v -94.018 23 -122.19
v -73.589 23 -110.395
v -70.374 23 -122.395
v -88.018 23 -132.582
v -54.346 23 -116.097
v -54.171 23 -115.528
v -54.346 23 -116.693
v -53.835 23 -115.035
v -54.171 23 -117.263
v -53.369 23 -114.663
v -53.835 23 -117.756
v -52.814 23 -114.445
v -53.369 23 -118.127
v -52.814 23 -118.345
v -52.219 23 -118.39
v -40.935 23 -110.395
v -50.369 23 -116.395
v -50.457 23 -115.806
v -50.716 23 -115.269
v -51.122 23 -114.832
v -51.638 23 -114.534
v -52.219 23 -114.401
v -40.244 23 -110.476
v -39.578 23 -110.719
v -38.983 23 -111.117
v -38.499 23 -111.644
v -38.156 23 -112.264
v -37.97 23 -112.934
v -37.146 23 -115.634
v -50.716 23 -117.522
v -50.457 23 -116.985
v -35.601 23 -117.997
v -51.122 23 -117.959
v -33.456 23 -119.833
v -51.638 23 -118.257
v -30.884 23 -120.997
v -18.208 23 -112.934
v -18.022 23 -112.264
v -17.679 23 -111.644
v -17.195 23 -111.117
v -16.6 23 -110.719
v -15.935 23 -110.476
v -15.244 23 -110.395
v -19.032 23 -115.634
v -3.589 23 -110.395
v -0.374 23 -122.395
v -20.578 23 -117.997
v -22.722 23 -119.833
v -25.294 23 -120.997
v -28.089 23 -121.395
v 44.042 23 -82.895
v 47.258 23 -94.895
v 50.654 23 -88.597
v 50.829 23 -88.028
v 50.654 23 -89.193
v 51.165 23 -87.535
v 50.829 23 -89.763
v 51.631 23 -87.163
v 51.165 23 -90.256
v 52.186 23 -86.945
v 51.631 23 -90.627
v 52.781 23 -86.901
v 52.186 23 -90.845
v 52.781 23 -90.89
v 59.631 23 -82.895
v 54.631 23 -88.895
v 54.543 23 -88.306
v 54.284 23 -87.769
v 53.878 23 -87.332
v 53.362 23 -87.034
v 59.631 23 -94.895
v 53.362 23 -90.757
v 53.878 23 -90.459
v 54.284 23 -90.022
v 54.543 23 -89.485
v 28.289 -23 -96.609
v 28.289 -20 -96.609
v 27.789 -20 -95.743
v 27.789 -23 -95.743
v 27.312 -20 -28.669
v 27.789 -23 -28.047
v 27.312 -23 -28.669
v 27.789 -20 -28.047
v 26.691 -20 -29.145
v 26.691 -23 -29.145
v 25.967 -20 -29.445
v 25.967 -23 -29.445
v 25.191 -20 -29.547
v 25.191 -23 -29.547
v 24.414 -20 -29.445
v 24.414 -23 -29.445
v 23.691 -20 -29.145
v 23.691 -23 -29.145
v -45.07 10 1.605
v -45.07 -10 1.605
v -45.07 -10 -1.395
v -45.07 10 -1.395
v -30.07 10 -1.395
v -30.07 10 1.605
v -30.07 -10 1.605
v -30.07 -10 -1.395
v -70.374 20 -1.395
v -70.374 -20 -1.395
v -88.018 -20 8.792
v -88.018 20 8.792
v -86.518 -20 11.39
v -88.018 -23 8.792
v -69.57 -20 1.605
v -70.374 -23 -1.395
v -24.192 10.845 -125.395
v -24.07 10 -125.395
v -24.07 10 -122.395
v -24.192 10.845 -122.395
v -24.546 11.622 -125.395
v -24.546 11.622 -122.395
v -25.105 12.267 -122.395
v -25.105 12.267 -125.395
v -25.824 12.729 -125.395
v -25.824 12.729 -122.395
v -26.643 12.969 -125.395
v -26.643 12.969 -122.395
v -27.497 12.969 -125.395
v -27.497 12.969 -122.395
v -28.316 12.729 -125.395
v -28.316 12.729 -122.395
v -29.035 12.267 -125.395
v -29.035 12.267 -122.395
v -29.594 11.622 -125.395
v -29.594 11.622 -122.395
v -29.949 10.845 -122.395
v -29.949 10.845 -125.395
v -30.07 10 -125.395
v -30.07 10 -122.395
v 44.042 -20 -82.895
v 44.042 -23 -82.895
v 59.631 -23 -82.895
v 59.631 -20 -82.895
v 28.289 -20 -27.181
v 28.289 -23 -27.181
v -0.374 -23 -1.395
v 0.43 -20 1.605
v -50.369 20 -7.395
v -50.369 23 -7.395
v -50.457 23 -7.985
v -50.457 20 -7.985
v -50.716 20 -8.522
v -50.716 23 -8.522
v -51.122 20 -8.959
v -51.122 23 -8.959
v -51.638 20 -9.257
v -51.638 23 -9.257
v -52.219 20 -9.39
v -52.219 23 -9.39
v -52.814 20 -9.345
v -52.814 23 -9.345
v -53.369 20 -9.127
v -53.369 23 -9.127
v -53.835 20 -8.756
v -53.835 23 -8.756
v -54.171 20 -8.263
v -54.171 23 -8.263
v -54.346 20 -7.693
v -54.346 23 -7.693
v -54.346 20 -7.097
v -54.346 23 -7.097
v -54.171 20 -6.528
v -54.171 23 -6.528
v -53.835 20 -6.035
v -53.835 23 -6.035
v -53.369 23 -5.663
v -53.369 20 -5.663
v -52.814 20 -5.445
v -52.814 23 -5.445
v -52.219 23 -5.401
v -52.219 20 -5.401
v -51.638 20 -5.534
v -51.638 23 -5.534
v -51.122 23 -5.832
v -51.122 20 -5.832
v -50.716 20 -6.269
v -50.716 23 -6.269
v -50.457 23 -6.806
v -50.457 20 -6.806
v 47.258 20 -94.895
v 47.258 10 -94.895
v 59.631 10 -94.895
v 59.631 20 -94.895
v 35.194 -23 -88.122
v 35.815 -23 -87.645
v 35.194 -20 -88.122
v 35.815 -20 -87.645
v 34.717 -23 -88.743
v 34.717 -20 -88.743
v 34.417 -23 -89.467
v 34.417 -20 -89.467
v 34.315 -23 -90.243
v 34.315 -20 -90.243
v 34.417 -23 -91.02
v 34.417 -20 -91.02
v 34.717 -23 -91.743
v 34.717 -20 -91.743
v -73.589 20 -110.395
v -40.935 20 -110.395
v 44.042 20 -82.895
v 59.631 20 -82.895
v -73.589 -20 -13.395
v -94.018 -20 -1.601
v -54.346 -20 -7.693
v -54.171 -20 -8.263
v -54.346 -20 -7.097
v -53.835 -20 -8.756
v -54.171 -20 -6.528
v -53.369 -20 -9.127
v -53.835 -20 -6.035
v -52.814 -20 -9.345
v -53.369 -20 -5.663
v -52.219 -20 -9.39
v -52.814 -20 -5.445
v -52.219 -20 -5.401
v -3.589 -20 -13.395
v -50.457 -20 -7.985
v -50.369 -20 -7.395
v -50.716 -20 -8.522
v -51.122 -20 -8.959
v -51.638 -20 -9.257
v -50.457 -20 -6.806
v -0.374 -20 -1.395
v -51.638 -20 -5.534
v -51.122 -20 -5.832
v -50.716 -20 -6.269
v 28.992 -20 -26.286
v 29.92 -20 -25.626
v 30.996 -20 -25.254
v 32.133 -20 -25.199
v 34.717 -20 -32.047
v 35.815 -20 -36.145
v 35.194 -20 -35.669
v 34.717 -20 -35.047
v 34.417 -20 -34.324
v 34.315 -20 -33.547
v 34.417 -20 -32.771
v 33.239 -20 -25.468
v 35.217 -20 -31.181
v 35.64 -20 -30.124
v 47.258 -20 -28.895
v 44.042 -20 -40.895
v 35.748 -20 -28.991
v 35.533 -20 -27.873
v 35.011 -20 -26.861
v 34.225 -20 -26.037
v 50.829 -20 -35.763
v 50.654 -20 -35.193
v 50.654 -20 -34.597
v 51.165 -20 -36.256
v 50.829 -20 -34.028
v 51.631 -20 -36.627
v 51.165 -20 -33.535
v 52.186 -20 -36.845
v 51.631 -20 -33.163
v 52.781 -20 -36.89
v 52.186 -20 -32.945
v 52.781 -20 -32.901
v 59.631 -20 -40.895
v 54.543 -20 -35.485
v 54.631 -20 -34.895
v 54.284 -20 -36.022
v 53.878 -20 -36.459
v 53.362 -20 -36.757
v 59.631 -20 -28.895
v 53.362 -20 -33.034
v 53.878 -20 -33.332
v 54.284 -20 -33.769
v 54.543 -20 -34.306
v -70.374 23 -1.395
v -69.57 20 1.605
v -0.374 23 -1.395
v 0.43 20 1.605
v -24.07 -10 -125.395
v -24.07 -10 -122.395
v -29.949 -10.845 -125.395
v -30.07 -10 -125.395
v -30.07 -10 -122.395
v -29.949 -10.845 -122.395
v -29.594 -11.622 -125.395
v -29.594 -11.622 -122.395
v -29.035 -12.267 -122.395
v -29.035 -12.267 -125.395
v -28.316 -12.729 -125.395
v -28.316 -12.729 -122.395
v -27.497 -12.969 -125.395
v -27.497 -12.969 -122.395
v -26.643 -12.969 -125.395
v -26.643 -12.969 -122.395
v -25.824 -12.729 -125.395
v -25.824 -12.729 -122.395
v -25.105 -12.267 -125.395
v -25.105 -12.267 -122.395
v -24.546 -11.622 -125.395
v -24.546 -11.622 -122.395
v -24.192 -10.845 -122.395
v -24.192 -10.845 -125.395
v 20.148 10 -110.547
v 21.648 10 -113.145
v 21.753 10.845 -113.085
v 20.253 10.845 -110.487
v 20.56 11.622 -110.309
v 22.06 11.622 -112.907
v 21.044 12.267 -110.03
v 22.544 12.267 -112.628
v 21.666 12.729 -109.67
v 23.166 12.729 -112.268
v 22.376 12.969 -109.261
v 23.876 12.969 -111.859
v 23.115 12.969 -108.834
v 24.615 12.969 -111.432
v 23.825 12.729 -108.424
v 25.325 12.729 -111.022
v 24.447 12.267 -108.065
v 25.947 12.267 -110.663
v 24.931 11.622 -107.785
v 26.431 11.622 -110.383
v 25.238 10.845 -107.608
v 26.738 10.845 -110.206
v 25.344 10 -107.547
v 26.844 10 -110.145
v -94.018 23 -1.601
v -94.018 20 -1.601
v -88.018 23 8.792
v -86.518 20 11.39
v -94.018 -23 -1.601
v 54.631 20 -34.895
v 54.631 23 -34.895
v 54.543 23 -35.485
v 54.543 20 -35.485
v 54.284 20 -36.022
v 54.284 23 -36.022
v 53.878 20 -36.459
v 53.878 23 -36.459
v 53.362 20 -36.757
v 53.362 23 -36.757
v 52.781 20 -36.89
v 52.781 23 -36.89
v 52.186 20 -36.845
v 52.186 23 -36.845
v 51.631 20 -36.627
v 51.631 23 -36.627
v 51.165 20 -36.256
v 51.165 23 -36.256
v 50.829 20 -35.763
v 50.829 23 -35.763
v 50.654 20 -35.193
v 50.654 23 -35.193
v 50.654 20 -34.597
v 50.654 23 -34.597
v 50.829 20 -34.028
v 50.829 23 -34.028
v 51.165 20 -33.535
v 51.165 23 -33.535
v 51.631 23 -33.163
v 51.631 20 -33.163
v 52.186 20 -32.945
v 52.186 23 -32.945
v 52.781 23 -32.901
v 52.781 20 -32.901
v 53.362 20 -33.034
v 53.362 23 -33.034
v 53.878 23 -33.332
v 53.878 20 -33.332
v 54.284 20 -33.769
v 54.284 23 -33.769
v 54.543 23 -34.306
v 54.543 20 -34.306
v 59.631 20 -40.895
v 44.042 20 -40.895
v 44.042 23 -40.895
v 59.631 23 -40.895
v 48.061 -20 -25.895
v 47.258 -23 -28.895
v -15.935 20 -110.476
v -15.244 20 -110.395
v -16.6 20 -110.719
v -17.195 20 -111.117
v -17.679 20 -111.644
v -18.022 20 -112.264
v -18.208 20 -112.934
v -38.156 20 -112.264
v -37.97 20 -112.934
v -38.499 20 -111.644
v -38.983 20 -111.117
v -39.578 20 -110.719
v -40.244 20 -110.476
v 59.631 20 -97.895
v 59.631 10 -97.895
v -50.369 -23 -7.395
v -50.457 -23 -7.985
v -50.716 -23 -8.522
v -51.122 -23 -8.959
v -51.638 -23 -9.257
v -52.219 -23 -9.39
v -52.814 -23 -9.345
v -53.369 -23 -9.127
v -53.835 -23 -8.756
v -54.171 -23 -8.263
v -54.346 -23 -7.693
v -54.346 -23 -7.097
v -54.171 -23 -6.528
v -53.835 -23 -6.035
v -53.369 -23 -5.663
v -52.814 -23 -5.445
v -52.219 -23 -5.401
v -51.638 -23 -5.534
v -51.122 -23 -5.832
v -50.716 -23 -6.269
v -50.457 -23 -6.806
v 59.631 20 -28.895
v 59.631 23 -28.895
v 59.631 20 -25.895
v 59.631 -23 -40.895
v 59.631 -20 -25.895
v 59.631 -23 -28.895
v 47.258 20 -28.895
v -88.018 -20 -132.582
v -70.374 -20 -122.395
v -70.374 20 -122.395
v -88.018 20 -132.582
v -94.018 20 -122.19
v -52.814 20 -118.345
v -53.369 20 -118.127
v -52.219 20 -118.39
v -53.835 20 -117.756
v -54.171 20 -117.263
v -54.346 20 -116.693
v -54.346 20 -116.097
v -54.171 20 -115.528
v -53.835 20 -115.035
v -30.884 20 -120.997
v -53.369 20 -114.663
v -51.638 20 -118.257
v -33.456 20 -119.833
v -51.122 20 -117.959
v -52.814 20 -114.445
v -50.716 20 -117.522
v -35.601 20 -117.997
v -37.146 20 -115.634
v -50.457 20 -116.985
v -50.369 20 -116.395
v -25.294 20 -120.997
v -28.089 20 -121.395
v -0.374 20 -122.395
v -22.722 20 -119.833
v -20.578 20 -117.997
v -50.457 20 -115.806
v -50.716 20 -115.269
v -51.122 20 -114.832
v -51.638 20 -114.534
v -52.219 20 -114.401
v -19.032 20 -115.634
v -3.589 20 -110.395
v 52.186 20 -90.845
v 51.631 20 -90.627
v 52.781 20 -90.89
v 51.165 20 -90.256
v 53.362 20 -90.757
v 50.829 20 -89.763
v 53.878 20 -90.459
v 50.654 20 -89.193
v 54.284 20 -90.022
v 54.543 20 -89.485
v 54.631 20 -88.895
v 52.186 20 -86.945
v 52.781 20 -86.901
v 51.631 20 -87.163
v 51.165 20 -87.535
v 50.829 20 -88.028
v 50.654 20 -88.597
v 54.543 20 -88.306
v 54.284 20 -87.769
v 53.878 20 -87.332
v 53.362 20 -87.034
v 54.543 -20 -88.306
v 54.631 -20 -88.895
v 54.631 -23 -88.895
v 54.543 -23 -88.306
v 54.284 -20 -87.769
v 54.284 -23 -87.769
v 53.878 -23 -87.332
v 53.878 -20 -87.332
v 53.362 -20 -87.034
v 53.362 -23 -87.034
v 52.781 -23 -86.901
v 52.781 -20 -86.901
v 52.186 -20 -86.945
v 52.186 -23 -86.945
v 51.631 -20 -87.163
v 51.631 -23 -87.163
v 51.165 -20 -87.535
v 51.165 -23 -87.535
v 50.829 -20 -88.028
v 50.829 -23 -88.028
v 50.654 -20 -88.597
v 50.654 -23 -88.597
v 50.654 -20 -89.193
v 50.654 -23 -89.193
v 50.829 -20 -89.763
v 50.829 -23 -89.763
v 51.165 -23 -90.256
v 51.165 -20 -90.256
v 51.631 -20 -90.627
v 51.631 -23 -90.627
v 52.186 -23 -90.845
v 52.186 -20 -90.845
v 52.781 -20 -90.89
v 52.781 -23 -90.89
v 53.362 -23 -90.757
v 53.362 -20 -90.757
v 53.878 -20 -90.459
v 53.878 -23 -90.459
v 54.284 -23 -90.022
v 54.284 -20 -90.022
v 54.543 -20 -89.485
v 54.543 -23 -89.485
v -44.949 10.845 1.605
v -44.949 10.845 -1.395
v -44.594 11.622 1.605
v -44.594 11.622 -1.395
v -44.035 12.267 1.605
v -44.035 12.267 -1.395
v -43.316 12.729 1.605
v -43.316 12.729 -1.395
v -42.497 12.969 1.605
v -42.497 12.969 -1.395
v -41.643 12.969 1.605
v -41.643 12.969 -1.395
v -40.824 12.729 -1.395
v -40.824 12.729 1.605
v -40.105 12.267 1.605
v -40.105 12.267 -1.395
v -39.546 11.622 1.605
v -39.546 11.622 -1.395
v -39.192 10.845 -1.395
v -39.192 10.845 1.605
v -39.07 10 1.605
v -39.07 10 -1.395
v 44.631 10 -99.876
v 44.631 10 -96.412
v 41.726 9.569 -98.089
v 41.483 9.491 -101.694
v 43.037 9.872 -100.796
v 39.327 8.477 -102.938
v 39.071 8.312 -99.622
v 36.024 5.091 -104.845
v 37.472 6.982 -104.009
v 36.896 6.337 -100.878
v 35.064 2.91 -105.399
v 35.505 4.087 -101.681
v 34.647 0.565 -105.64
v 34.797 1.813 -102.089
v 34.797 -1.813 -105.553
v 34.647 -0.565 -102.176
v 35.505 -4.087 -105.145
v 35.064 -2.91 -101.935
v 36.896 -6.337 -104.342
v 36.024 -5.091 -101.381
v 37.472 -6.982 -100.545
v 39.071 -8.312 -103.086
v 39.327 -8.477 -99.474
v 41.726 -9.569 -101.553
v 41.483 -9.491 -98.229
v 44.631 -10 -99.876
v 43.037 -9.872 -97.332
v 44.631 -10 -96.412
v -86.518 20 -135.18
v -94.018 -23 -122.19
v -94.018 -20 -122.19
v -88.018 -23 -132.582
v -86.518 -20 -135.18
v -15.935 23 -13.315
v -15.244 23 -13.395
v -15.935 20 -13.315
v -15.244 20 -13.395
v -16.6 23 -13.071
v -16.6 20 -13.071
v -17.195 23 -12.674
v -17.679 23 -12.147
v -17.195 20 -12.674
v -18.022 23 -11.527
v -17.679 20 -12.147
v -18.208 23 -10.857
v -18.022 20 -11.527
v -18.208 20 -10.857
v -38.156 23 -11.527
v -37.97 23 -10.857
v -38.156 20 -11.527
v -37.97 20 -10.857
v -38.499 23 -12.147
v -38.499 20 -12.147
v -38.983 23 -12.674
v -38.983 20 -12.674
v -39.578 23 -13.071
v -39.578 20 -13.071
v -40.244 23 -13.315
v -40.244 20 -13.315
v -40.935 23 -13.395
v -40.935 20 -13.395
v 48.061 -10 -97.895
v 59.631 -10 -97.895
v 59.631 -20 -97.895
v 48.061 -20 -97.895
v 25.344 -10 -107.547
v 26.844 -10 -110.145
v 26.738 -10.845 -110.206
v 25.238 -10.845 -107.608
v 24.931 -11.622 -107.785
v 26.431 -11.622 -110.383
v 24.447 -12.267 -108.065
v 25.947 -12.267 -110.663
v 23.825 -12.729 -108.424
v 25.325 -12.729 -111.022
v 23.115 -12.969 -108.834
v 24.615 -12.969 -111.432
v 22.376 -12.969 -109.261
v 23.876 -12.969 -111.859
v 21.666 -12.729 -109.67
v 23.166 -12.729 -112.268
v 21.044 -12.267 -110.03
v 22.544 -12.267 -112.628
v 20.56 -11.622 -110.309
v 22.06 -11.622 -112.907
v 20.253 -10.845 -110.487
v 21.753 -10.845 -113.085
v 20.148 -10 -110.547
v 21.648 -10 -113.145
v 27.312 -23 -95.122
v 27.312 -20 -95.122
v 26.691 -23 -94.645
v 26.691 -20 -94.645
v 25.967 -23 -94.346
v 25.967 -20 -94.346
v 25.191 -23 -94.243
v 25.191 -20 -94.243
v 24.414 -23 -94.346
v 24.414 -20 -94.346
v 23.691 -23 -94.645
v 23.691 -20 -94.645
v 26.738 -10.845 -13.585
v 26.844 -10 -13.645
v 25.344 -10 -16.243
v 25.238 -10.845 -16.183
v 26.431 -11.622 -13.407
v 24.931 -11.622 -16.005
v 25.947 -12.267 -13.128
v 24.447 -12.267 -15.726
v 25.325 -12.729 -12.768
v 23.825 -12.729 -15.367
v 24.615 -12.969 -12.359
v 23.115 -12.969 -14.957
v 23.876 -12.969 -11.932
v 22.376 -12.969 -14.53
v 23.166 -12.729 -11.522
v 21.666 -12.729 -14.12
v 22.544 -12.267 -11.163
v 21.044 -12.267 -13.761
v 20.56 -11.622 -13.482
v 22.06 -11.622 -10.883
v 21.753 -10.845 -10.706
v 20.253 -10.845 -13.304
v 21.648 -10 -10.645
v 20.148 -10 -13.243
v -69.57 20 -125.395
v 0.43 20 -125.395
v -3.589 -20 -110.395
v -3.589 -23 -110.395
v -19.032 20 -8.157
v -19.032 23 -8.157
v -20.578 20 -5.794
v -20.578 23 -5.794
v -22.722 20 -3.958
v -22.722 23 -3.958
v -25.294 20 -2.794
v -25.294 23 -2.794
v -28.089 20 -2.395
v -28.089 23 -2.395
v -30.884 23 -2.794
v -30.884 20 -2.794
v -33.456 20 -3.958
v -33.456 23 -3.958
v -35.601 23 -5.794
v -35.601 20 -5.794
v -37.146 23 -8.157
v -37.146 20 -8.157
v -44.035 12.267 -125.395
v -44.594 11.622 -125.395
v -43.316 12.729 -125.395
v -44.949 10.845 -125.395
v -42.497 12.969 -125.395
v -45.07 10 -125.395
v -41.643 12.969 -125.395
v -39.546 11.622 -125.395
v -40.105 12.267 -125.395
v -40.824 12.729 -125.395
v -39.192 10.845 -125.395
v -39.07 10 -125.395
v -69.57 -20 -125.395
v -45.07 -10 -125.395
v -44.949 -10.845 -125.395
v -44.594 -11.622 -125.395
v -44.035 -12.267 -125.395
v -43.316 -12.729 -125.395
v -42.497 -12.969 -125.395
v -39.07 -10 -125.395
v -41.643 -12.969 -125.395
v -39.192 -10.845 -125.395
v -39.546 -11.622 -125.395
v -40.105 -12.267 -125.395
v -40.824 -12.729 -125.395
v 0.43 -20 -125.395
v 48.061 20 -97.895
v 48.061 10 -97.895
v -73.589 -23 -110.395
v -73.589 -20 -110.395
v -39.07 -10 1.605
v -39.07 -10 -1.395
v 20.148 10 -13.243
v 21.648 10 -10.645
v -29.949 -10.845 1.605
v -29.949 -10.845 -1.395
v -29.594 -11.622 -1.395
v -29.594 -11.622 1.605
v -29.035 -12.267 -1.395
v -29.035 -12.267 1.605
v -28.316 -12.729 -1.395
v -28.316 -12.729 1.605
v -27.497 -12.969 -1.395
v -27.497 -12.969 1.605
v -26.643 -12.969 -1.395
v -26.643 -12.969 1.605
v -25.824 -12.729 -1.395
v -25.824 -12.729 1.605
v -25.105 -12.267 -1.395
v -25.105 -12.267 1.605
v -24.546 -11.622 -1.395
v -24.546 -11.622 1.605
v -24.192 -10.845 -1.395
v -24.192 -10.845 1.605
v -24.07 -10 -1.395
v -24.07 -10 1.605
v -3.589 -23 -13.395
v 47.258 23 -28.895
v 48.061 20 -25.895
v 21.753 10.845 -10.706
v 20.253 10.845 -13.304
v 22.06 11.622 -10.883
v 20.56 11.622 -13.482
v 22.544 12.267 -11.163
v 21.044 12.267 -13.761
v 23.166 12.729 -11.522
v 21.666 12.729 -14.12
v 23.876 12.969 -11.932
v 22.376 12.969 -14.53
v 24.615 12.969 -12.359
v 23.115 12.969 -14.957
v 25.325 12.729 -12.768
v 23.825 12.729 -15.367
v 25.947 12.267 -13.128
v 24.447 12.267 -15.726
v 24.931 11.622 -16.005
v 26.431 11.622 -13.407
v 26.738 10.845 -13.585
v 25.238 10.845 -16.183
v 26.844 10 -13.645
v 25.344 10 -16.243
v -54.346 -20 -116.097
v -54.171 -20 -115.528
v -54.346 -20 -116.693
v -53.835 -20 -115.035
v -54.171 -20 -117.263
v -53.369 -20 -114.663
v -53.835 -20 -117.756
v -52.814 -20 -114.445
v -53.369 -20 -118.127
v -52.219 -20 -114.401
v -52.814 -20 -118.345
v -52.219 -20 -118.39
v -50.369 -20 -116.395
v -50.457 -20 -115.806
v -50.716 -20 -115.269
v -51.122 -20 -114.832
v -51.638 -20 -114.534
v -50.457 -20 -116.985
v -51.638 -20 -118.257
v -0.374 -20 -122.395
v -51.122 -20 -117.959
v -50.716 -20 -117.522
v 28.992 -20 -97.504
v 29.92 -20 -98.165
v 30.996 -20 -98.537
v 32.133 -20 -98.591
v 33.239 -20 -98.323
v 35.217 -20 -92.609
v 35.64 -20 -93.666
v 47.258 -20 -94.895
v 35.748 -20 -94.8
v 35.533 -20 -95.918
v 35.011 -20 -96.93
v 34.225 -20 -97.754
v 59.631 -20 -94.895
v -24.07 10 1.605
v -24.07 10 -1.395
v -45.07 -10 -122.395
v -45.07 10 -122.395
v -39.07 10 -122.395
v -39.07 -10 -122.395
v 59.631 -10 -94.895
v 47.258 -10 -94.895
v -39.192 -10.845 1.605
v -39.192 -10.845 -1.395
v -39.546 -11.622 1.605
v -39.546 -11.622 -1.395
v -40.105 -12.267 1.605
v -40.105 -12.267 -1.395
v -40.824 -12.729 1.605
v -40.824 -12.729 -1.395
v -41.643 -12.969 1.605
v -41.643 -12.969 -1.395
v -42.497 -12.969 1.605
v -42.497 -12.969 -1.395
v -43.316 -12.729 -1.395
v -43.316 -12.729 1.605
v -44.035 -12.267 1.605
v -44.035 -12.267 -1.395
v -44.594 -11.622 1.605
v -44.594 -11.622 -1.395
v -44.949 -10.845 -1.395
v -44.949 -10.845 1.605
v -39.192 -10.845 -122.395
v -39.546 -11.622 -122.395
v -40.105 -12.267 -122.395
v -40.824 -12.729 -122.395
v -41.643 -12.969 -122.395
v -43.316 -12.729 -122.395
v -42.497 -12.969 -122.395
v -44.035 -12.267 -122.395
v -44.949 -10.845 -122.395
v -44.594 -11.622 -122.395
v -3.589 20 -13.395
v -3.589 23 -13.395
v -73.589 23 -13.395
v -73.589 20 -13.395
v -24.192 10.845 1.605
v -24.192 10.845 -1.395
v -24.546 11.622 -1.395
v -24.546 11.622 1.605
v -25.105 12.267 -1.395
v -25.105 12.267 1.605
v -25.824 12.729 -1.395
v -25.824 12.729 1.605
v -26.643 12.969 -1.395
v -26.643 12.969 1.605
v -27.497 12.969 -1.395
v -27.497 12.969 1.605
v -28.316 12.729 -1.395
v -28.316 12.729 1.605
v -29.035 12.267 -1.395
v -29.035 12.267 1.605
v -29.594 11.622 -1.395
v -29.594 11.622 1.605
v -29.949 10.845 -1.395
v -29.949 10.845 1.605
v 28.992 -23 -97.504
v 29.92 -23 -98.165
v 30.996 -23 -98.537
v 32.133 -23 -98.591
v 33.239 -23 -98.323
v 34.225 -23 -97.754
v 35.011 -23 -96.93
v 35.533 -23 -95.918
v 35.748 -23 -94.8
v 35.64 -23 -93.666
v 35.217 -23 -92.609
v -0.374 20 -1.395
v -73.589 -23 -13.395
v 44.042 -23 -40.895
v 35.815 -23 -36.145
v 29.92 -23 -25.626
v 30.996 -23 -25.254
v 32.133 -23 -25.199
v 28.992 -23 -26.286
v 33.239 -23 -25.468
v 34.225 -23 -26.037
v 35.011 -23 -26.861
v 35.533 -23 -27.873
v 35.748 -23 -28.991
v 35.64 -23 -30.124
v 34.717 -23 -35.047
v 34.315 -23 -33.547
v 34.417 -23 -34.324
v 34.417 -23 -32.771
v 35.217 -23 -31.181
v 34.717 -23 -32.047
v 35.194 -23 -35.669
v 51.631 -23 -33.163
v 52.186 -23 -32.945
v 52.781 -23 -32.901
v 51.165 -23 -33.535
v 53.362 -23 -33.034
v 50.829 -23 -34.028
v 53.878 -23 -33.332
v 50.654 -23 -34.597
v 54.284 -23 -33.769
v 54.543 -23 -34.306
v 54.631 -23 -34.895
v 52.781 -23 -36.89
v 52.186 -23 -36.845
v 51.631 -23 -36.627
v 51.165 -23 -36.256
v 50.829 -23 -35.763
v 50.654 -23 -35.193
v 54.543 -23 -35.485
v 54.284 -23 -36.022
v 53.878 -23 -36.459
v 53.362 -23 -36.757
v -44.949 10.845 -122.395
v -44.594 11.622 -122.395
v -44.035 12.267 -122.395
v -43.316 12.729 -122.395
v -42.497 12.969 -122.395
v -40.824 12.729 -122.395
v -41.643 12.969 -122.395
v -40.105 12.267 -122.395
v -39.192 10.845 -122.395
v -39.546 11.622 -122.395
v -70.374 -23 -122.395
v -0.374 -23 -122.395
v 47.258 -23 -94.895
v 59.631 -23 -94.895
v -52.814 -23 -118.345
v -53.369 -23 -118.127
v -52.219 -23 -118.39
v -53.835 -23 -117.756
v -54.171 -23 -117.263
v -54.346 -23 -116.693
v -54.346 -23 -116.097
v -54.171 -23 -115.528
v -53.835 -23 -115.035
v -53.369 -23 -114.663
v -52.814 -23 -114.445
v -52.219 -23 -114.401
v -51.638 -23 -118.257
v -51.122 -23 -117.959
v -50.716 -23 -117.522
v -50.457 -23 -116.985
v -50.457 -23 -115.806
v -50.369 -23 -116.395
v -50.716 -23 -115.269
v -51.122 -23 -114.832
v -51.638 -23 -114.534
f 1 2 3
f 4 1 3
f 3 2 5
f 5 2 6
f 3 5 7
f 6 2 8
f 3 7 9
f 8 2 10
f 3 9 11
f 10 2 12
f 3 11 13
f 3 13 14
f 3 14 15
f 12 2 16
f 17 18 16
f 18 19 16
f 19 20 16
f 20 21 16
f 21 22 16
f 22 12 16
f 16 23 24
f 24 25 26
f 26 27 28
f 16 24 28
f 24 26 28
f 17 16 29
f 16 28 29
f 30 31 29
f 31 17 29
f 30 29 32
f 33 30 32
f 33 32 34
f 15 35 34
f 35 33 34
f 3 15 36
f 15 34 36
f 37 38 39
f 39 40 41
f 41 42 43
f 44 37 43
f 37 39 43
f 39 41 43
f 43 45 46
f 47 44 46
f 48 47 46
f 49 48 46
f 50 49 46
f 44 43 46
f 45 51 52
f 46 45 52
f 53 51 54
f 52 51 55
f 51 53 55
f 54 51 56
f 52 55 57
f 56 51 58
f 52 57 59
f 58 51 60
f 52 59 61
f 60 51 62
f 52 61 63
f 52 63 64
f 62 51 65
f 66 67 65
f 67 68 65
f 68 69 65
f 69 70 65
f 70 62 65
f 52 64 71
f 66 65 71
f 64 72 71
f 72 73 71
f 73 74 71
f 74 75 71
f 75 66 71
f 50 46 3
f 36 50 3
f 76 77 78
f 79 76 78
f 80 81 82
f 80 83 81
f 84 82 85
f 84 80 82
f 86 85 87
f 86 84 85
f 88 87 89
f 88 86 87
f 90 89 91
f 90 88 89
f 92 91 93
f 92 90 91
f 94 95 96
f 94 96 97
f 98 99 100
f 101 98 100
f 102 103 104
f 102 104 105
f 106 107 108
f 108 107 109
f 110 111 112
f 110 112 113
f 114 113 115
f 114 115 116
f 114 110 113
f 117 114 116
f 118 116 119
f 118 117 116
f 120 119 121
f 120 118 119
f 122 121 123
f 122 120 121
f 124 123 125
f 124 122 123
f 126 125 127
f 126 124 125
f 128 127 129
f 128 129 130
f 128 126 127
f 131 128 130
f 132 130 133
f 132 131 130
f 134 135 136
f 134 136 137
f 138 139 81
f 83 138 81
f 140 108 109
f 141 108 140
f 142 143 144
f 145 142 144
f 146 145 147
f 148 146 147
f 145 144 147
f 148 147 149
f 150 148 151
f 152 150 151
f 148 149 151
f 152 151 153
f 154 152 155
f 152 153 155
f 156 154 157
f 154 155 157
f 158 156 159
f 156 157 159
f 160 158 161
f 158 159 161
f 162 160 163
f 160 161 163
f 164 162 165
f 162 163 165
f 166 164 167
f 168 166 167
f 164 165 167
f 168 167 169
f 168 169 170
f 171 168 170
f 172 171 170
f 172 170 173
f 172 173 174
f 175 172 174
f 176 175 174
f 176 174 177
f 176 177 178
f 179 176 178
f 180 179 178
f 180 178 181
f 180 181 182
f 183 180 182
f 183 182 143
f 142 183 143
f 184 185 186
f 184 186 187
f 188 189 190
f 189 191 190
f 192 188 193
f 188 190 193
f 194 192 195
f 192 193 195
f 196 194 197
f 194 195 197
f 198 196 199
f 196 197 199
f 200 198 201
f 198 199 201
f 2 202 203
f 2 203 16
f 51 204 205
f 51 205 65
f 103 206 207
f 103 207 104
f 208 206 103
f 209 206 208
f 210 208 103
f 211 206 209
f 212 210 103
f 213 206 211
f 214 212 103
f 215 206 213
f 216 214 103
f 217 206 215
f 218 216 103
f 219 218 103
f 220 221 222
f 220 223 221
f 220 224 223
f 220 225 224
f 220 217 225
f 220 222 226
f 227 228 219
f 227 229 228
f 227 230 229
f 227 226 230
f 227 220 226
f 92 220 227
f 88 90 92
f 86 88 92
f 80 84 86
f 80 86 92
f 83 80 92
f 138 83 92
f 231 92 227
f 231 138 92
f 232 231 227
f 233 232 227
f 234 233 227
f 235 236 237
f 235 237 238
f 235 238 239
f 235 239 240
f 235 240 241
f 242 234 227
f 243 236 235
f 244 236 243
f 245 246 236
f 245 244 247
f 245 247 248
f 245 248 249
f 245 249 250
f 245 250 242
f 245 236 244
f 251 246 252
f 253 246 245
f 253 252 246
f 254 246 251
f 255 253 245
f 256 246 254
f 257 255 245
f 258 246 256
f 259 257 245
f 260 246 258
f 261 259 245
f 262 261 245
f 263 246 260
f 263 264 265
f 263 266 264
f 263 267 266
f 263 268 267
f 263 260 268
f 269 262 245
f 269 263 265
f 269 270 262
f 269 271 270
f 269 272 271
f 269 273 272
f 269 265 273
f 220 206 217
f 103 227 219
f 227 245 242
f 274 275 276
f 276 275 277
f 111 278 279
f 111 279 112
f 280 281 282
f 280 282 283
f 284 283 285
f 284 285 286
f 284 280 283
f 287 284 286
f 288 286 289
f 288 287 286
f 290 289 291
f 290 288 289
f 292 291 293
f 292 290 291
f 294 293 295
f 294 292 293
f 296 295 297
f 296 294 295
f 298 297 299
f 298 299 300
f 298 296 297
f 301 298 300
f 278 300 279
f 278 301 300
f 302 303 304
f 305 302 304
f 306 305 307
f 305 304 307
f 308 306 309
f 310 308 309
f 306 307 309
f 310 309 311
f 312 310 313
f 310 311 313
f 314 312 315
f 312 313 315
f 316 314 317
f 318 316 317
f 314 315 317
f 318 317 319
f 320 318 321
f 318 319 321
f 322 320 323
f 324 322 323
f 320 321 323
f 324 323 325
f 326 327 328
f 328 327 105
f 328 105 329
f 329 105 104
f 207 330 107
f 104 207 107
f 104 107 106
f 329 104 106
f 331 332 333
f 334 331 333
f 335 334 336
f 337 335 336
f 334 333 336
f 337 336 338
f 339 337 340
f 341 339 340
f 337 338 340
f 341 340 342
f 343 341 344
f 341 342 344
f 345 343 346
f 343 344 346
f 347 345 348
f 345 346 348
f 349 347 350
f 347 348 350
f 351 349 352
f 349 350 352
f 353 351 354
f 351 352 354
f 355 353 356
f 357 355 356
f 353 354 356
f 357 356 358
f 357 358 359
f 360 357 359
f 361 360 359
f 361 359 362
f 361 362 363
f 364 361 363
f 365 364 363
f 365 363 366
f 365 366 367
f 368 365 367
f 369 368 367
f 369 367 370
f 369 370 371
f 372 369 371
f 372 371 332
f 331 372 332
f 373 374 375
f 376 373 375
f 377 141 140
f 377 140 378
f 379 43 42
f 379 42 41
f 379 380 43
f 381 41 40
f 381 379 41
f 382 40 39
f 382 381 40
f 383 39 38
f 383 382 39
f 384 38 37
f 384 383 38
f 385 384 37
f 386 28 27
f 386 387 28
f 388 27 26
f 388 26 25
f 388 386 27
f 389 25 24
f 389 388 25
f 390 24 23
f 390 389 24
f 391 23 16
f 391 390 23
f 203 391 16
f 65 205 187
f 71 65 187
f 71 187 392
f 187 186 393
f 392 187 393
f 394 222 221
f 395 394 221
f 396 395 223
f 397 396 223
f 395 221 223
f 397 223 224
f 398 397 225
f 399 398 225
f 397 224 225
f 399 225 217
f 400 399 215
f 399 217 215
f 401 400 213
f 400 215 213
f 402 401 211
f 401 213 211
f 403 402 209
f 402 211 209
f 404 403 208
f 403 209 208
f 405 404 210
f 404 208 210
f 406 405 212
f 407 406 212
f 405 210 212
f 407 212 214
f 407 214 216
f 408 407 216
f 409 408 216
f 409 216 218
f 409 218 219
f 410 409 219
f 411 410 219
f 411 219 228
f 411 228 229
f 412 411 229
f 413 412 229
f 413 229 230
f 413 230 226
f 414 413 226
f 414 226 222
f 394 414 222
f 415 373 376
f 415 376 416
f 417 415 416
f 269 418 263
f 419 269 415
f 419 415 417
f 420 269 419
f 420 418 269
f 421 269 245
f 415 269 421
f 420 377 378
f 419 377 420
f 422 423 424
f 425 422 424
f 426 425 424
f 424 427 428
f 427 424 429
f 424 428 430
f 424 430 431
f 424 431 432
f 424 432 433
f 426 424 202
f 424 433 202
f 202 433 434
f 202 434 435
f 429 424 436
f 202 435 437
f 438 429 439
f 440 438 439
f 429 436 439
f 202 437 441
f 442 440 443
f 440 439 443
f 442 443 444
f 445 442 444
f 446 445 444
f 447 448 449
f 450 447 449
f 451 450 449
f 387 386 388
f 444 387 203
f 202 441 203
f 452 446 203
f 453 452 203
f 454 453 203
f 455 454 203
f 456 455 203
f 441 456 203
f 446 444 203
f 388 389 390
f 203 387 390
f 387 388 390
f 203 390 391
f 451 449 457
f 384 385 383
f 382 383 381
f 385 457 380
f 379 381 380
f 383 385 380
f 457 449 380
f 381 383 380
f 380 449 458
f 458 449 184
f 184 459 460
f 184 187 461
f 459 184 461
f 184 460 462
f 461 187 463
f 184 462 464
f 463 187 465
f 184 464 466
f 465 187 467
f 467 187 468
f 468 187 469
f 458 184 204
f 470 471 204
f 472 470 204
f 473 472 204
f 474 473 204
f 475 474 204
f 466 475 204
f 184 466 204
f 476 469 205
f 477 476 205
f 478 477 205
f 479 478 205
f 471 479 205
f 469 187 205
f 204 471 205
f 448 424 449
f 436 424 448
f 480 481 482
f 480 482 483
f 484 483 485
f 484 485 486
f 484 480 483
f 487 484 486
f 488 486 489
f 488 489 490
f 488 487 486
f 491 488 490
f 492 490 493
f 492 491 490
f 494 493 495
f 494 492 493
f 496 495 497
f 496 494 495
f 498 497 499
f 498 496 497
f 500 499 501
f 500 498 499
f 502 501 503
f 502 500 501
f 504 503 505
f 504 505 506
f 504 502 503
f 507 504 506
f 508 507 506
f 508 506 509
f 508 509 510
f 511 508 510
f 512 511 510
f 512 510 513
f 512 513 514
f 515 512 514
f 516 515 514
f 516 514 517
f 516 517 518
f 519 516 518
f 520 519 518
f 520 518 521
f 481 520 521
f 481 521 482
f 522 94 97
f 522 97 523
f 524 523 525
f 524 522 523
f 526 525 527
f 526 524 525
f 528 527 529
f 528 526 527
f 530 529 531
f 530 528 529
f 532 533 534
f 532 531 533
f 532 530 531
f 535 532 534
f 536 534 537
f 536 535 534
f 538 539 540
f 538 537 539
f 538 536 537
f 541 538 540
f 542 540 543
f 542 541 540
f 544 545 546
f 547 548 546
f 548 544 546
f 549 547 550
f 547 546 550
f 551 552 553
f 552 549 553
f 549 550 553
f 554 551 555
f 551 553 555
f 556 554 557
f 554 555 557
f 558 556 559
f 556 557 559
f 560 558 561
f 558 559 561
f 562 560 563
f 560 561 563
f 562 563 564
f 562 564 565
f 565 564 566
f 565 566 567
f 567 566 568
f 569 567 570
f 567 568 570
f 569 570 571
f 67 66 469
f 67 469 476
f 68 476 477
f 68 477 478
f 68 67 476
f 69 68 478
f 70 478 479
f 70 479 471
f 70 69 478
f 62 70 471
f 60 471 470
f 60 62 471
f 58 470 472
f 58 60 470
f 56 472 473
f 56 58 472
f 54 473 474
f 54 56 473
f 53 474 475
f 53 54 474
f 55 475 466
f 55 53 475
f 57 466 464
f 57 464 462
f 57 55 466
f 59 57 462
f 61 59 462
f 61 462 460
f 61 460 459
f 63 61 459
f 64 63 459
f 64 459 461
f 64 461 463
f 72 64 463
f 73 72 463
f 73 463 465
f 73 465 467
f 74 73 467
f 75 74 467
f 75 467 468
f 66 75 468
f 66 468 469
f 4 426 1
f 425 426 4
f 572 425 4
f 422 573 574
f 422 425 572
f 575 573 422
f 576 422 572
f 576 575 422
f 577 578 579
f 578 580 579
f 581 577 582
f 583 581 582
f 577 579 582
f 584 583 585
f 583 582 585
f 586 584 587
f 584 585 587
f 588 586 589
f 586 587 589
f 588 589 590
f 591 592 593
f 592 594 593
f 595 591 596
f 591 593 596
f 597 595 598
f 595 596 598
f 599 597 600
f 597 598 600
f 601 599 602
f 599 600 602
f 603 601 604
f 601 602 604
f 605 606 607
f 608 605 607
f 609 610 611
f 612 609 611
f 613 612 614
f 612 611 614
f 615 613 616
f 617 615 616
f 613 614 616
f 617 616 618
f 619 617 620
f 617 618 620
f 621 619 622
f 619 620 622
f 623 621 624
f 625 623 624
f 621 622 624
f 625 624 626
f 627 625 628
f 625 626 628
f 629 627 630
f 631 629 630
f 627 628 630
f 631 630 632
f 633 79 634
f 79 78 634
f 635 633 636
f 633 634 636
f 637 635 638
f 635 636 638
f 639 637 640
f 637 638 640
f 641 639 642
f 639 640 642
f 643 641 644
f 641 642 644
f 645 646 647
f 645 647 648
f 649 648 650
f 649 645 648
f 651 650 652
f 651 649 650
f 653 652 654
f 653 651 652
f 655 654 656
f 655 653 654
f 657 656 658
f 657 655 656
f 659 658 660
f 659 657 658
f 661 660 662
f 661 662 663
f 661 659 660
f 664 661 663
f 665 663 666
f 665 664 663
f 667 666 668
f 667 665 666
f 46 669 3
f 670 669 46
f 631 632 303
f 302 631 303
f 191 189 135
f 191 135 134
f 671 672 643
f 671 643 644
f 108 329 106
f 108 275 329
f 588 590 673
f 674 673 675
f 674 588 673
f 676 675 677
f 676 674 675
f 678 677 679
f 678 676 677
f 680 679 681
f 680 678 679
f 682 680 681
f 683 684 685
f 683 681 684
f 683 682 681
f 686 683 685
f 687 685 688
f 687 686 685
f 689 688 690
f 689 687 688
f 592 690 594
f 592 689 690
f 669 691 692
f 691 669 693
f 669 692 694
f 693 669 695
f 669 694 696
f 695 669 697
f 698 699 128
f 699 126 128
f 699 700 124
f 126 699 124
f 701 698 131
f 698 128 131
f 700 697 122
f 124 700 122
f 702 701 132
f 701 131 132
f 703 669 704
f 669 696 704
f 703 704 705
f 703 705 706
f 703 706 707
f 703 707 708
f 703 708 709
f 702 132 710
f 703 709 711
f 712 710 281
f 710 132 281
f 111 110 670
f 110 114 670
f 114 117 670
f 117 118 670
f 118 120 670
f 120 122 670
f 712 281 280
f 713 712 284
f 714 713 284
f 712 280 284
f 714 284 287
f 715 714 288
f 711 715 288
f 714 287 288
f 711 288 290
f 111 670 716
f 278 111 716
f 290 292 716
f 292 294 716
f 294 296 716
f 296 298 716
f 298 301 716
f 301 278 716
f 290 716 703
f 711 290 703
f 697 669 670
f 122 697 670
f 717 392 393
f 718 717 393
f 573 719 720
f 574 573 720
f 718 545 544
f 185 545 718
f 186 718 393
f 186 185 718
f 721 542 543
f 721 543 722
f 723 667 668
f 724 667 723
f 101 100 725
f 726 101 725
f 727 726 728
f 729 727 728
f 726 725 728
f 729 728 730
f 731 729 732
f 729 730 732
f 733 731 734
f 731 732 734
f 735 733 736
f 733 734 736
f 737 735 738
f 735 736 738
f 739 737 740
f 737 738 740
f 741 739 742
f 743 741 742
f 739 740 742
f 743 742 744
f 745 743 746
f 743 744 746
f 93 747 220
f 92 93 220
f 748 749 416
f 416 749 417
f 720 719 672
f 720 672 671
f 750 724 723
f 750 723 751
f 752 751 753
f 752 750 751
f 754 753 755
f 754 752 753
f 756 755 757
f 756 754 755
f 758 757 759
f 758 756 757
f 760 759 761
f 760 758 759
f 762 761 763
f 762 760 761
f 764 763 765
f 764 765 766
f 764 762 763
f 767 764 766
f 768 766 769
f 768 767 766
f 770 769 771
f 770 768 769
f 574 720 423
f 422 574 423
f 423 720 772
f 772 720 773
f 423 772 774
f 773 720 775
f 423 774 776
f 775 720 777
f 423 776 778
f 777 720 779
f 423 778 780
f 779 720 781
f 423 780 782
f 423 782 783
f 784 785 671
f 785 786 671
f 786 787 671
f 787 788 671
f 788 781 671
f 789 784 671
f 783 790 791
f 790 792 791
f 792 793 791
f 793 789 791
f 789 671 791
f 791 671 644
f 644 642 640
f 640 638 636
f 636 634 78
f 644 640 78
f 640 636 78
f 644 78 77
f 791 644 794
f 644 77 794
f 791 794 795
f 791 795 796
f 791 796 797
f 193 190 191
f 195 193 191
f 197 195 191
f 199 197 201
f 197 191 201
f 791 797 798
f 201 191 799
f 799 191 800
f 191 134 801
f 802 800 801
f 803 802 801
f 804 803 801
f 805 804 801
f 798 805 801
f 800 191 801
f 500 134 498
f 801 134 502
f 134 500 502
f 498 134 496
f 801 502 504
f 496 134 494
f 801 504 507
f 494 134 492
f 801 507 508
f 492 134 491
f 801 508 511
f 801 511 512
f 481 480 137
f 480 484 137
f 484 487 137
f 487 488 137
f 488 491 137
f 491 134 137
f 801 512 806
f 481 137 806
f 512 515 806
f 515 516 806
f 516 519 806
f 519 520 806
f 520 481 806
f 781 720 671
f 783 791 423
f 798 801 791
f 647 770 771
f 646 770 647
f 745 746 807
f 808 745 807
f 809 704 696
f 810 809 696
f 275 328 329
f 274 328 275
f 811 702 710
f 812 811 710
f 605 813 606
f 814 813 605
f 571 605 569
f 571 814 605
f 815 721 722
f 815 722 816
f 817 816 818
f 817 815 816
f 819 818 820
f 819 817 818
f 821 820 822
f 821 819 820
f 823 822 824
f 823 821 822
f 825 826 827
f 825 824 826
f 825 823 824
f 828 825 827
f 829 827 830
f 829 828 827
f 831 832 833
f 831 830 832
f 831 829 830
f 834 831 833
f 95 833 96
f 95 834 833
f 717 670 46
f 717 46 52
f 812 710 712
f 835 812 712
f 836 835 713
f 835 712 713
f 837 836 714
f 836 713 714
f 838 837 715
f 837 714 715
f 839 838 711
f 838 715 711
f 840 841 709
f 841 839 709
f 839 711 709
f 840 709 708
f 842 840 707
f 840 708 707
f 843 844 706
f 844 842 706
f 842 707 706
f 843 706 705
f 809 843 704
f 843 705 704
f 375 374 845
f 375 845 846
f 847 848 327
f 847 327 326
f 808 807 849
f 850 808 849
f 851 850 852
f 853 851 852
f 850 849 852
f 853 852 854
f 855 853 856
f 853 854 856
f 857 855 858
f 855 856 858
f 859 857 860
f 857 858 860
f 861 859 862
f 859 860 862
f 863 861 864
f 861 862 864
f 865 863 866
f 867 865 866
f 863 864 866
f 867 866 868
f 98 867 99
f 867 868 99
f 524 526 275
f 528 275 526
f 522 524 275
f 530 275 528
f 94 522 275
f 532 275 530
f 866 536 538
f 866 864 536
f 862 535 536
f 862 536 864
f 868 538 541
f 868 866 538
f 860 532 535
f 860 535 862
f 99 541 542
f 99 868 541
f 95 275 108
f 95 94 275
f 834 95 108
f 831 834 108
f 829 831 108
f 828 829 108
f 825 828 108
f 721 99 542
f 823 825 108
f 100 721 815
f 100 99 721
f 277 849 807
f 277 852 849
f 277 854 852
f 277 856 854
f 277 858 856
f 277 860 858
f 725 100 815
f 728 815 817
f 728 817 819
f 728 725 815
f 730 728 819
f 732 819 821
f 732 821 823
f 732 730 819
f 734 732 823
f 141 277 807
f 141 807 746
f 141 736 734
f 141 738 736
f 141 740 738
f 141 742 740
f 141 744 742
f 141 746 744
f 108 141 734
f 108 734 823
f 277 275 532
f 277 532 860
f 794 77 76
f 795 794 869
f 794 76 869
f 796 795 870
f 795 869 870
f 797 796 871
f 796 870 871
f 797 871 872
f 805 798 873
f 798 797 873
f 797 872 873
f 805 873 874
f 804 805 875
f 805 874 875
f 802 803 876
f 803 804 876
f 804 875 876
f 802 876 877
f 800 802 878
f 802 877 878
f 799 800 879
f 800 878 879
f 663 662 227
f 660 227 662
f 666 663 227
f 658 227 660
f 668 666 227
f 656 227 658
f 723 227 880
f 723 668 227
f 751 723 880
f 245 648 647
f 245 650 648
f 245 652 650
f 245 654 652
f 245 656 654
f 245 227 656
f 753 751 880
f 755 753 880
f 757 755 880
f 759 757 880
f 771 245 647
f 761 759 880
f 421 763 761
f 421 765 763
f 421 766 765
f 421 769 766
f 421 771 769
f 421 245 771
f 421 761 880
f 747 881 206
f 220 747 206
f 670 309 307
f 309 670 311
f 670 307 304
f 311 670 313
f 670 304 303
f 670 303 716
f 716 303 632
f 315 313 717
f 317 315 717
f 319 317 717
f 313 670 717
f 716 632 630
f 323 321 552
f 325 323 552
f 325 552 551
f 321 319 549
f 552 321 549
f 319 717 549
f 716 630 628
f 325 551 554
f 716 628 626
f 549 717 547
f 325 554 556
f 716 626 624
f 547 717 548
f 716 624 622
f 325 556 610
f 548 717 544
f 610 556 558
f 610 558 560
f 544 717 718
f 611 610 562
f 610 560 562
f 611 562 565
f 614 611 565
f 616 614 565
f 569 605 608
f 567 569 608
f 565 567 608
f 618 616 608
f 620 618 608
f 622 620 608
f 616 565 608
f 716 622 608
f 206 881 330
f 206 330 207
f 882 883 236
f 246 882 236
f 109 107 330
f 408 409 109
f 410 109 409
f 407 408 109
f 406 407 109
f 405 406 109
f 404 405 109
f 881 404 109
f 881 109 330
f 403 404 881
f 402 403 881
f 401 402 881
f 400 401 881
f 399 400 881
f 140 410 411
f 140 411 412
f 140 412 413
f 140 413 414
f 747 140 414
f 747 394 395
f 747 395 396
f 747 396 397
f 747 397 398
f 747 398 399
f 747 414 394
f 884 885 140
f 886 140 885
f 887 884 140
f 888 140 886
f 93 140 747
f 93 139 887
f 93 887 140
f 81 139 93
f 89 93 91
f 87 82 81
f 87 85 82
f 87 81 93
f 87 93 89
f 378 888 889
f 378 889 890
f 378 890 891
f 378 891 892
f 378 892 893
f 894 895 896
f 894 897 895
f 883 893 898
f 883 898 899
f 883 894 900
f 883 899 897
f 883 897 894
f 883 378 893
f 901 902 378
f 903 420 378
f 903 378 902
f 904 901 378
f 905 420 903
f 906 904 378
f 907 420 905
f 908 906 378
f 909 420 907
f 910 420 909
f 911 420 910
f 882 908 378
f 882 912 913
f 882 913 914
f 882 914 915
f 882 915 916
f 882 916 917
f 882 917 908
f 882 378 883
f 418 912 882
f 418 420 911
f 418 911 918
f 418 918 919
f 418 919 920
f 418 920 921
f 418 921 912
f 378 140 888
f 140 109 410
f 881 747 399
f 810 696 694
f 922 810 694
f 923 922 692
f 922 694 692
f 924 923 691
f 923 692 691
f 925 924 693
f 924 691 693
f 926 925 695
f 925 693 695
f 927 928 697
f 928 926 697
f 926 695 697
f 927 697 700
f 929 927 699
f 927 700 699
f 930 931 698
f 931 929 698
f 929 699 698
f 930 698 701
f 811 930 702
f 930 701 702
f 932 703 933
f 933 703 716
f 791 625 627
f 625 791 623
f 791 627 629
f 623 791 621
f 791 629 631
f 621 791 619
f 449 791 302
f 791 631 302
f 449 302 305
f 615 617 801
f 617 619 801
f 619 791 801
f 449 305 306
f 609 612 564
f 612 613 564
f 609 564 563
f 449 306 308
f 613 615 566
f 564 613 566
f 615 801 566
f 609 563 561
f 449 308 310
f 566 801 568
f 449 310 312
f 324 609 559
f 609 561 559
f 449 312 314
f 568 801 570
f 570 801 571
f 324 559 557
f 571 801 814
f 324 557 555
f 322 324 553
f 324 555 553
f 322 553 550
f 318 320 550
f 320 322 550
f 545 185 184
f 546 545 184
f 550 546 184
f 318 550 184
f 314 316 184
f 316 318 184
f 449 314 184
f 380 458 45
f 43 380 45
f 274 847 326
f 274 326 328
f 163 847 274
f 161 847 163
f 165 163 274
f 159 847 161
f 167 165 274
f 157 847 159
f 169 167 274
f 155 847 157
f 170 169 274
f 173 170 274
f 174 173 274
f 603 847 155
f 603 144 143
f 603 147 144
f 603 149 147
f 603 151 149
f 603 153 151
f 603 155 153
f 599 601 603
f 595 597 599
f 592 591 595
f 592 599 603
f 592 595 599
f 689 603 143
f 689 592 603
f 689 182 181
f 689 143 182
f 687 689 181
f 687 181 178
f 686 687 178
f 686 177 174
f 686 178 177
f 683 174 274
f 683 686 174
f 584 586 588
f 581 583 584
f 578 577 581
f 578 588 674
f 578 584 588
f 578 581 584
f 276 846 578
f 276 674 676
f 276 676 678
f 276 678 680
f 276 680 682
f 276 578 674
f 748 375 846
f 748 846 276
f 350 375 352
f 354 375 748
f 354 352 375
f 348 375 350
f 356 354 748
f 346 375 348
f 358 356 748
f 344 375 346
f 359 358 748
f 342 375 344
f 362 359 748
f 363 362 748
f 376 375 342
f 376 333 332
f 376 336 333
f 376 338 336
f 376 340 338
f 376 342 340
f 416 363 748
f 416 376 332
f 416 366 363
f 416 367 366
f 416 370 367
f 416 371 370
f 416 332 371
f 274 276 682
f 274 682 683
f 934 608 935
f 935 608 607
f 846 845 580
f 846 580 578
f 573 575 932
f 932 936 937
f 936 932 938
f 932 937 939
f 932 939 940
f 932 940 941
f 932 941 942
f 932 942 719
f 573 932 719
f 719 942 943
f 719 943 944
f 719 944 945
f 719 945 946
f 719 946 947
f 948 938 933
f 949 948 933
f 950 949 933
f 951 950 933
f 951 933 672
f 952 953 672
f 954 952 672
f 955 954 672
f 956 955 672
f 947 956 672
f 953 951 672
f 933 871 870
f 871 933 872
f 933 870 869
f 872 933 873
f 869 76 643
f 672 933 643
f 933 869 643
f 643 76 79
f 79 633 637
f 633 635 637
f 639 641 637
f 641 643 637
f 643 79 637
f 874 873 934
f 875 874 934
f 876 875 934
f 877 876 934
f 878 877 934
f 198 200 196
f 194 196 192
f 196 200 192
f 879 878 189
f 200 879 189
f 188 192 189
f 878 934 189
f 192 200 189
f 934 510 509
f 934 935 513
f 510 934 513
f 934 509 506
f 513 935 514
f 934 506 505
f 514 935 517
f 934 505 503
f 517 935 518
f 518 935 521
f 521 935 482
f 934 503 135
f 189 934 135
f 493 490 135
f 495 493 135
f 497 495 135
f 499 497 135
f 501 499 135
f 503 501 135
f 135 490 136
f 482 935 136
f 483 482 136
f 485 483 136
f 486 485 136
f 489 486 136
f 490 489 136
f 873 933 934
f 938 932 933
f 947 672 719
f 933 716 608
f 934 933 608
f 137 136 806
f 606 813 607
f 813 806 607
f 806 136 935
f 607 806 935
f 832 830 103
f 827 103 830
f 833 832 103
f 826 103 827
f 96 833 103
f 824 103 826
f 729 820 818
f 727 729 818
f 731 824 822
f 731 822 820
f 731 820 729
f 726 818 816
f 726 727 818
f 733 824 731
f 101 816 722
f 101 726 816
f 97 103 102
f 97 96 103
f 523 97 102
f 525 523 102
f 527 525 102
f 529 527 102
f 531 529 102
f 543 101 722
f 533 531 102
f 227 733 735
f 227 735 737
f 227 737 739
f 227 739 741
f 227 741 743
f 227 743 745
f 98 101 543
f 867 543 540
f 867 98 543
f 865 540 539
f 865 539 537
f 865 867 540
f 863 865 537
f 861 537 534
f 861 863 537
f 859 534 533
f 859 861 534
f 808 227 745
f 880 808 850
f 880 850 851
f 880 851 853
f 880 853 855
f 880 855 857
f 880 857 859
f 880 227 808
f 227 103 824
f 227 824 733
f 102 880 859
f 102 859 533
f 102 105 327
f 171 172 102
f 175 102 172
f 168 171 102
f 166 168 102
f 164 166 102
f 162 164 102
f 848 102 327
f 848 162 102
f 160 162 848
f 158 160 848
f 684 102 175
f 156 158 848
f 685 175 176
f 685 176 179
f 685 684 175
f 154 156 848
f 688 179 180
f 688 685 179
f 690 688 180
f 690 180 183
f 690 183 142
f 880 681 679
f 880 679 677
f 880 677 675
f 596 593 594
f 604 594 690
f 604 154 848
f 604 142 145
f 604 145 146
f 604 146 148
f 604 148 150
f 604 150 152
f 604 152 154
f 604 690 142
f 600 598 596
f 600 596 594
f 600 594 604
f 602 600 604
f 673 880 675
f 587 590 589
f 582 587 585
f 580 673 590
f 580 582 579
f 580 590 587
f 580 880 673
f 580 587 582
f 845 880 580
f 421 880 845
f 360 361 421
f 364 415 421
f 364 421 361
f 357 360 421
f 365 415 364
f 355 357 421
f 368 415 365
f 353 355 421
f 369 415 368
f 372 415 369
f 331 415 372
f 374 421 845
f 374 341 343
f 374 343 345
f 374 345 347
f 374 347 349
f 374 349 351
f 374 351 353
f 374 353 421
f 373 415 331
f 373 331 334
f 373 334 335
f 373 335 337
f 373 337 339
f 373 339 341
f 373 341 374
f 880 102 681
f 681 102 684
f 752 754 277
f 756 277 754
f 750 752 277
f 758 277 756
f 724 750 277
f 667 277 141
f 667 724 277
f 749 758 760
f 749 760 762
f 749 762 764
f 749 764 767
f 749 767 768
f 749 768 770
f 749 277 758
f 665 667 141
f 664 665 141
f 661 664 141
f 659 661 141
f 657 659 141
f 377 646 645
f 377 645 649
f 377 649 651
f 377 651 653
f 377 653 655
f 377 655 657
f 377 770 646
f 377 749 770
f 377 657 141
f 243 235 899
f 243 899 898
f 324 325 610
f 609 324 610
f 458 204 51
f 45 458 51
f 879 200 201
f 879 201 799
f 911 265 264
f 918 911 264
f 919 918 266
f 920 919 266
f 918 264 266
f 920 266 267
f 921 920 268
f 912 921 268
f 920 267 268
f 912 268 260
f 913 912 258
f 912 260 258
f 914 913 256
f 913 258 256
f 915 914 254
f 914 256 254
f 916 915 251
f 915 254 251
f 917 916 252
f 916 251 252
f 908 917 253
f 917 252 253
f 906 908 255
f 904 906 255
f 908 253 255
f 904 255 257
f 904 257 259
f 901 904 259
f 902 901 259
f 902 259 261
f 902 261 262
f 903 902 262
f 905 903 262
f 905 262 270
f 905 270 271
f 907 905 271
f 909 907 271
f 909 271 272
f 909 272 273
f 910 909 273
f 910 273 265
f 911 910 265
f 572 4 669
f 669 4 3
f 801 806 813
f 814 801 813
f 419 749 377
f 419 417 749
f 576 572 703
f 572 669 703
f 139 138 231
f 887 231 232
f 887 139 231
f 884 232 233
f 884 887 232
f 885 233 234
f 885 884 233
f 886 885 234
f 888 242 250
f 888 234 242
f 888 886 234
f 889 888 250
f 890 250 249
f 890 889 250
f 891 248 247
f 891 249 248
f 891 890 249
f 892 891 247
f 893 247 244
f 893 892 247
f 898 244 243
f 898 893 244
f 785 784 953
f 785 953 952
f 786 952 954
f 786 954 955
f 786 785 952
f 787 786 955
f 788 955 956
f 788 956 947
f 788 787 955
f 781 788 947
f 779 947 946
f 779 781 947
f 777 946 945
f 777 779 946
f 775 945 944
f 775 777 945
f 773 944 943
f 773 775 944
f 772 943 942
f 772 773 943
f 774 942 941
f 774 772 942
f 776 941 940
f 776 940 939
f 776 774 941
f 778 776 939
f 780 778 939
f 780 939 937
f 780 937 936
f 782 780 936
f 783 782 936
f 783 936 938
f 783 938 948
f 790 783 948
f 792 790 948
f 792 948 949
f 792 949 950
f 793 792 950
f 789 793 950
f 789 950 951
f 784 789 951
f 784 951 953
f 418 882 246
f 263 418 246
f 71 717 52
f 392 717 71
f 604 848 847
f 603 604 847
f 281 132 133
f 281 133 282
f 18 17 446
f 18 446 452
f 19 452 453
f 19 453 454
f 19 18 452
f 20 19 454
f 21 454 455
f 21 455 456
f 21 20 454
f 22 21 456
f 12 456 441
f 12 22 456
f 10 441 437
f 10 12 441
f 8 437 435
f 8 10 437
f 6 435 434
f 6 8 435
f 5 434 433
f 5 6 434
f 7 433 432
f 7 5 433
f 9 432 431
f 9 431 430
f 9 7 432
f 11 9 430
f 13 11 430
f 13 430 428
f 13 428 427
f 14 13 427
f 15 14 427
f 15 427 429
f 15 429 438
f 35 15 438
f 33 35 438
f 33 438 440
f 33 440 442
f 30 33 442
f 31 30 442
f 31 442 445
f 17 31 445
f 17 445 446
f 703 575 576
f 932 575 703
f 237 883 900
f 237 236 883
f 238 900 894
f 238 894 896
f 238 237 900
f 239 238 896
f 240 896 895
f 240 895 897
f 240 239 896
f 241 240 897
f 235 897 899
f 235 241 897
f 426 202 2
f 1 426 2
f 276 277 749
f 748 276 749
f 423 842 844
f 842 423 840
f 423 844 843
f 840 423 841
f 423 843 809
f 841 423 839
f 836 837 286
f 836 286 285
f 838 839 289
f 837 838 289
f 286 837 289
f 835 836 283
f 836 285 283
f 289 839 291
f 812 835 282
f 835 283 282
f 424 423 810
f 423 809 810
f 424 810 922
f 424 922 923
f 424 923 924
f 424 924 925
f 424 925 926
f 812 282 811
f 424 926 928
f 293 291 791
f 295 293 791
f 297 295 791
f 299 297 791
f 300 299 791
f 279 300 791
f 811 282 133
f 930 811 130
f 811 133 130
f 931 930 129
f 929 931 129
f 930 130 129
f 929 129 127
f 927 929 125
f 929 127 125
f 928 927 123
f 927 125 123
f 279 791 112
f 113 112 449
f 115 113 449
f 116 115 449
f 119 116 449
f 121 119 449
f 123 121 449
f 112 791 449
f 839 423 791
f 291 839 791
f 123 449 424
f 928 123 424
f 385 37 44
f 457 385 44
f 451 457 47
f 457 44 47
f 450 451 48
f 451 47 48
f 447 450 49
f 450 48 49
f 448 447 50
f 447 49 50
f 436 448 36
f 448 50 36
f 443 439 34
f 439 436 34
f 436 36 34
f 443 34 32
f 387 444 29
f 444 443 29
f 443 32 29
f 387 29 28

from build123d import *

# Parameters (mm, degrees)
CUT_EXTRUDE3_DEPTH      = 5
CUT_EXTRUDE4_DEPTH      = 10
CHAMFER1_SIZE           = 3
CUT_EXTRUDE6_DEPTH      = 3
F_4_0MM_DOWEL_HOLE2_D   = 4
CUT_EXTRUDE9_DEPTH      = 10
CUT_EXTRUDE7_DEPTH      = 146.985046122
CUT_EXTRUDE7_DEPTH_BACK = 5
FILLET1_R               = 3
FILLET2_R               = 3


with BuildPart() as part:
    # Sweep8: sweep along a path in Sketch6
    with BuildLine(Plane(origin=(0, 0, 0), x_dir=(1, 0, 0), z_dir=(0, 1, 0))) as sweep8_path:
        Line((-87.320508076, -10), (-70, 0))
        Line((-70, 0), (0, 0))
        Line((0, 0), (47.631397208, 27.5))
        Line((47.631397208, 27.5), (59.631397208, 27.5))
    # Sketch7 → Sweep8 (sweep)
    with BuildSketch(Plane(origin=(0, 0, 0), x_dir=(0, 0, -1), z_dir=(1, 0, 0))):
        Polygon((-1.604651163, -23), (-1.604651163, 23), (13.395348837, 23), (13.395348837, 20), (1.395348837, 20), (1.395348837, -20), (13.395348837, -20), (13.395348837, -23), align=None)
    sweep(path=sweep8_path.line, transition=Transition.RIGHT)

    # Sketch10 → Cut-Extrude3 (cut)
    with BuildSketch(Plane(origin=(0, 23, 0), x_dir=(1, 0, 0), z_dir=(0, 1, 0))):
        with BuildLine():
            Line((-38.089272903, 13.395348837), (-18.089272903, 13.395348837))
            Line((-18.089272903, 13.395348837), (-18.089272903, 12.395348837))
            ThreePointArc((-18.089272903, 12.395348837), (-28.089272903, 2.395348837), (-38.089272903, 12.395348837))
            Line((-38.089272903, 12.395348837), (-38.089272903, 13.395348837))
        make_face()
    extrude(amount=-CUT_EXTRUDE3_DEPTH, mode=Mode.SUBTRACT)

    # Sketch11 → Cut-Extrude4 (cut)
    with BuildSketch(Plane.XY.offset(1.604651163)):
        with BuildLine():
            Line((-45.070035017, -10), (-45.070035017, 10))
            ThreePointArc((-45.070035017, 10), (-42.070035017, 13), (-39.070035017, 10))
            Line((-39.070035017, 10), (-39.070035017, -10))
            ThreePointArc((-39.070035017, -10), (-42.070035017, -13), (-45.070035017, -10))
        make_face()
        with BuildLine():
            Line((-24.070035017, -10), (-24.070035017, 10))
            ThreePointArc((-24.070035017, 10), (-27.070035017, 13), (-30.070035017, 10))
            Line((-30.070035017, 10), (-30.070035017, -10))
            ThreePointArc((-30.070035017, -10), (-27.070035017, -13), (-24.070035017, -10))
        make_face()
    extrude(amount=-CUT_EXTRUDE4_DEPTH, mode=Mode.SUBTRACT)

    # Chamfer1
    chamfer1_edges = [part.edges().sort_by_distance(p)[0] for p in [
        (-78.044108756, -23, 6.497159917),
        (-34.570035017, -23, 1.604651163),
        (24.245663587, -23, -12.145348837),
        (-78.044108756, 23, 6.497159917),
        (-34.570035017, 23, 1.604651163),
        (24.245663587, 23, -12.145348837),
        (53.8463797, -23, -25.895348837),
        (53.8463797, 23, -25.895348837),
    ]]
    chamfer(chamfer1_edges, length=CHAMFER1_SIZE)

    # Sketch14 → Cut-Extrude6 (cut)
    with BuildSketch(Plane(origin=(0.802325581, 0, 1.389668671), x_dir=(0.8660254037844379, 0, -0.5000000000000014), z_dir=(0.5000000000000014, 0, 0.8660254037844379))):
        with BuildLine():
            Line((24.070035017, -10), (24.070035017, 10))
            ThreePointArc((24.070035017, 10), (27.070035017, 13), (30.070035017, 10))
            Line((30.070035017, 10), (30.070035017, -10))
            ThreePointArc((30.070035017, -10), (27.070035017, -13), (24.070035017, -10))
        make_face()
    extrude(amount=-CUT_EXTRUDE6_DEPTH, mode=Mode.SUBTRACT)

    # Ø4.0mm Dowel Hole2 (through all)
    with Locations(Plane(origin=(0, -23, 0), x_dir=(-1, 0, 0), z_dir=(0, -1, 0))):
        with Locations((52.368602792, 7.395348837), (-52.631397208, 34.895348837)):
            Hole(F_4_0MM_DOWEL_HOLE2_D / 2)

    # Sketch22 → Cut-Extrude9 (cut)
    with BuildSketch(Plane.XZ.offset(23)):
        with BuildLine():
            Line((28.288603527, -27.181247222), (26.288603527, -30.645348837))
            Line((26.288603527, -30.645348837), (33.216806758, -34.645348837))
            Line((33.216806758, -34.645348837), (35.216806758, -31.181247222))
            ThreePointArc((35.216806758, -31.181247222), (33.752705142, -25.717145607), (28.288603527, -27.181247222))
        make_face()
    extrude(amount=-CUT_EXTRUDE9_DEPTH, mode=Mode.SUBTRACT)


with BuildPart() as body_2:
    # Mirror2: mirrored copy
    add(part.part.mirror(Plane(origin=(0, 0, -61.895348837), x_dir=(1, 0, 0), z_dir=(0, 0, -1))))

    # Sketch20 → Cut-Extrude7 (cut, two sides: drawn at the far end of the back side and taken through both)
    with BuildSketch(Plane(origin=(0, 0, -97.895348837), x_dir=(-1, 0, 0), z_dir=(0, 0, -1)).offset(-CUT_EXTRUDE7_DEPTH_BACK)):
        with BuildLine():
            ThreePointArc((-44.631397208, -10), (-34.631397208, 0), (-44.631397208, 10))
            Line((-44.631397208, 10), (-59.631397208, 10))
            Line((-59.631397208, 10), (-59.631397208, -10))
            Line((-59.631397208, -10), (-44.631397208, -10))
        make_face()
    extrude(amount=CUT_EXTRUDE7_DEPTH + CUT_EXTRUDE7_DEPTH_BACK, mode=Mode.SUBTRACT)

    # Fillet2
    fillet2_edges = [body_2.edges().sort_by_distance(p)[0] for p in [
        (-38.089272903, 21.5, -110.395348837),
        (-18.089272903, 21.5, -110.395348837),
        (26.288603527, -21.5, -93.145348837),
        (33.216806758, -21.5, -89.145348837),
    ]]
    fillet(fillet2_edges, radius=FILLET2_R)


with BuildPart() as part_1:
    add(part.part)

    # Fillet1
    fillet1_edges = [part_1.edges().sort_by_distance(p)[0] for p in [
        (26.288603527, -21.5, -30.645348837),
        (33.216806758, -21.5, -34.645348837),
        (-18.089272903, 21.5, -13.395348837),
        (-38.089272903, 21.5, -13.395348837),
    ]]
    fillet(fillet1_edges, radius=FILLET1_R)


solid = Compound([body_2.part, part_1.part])
